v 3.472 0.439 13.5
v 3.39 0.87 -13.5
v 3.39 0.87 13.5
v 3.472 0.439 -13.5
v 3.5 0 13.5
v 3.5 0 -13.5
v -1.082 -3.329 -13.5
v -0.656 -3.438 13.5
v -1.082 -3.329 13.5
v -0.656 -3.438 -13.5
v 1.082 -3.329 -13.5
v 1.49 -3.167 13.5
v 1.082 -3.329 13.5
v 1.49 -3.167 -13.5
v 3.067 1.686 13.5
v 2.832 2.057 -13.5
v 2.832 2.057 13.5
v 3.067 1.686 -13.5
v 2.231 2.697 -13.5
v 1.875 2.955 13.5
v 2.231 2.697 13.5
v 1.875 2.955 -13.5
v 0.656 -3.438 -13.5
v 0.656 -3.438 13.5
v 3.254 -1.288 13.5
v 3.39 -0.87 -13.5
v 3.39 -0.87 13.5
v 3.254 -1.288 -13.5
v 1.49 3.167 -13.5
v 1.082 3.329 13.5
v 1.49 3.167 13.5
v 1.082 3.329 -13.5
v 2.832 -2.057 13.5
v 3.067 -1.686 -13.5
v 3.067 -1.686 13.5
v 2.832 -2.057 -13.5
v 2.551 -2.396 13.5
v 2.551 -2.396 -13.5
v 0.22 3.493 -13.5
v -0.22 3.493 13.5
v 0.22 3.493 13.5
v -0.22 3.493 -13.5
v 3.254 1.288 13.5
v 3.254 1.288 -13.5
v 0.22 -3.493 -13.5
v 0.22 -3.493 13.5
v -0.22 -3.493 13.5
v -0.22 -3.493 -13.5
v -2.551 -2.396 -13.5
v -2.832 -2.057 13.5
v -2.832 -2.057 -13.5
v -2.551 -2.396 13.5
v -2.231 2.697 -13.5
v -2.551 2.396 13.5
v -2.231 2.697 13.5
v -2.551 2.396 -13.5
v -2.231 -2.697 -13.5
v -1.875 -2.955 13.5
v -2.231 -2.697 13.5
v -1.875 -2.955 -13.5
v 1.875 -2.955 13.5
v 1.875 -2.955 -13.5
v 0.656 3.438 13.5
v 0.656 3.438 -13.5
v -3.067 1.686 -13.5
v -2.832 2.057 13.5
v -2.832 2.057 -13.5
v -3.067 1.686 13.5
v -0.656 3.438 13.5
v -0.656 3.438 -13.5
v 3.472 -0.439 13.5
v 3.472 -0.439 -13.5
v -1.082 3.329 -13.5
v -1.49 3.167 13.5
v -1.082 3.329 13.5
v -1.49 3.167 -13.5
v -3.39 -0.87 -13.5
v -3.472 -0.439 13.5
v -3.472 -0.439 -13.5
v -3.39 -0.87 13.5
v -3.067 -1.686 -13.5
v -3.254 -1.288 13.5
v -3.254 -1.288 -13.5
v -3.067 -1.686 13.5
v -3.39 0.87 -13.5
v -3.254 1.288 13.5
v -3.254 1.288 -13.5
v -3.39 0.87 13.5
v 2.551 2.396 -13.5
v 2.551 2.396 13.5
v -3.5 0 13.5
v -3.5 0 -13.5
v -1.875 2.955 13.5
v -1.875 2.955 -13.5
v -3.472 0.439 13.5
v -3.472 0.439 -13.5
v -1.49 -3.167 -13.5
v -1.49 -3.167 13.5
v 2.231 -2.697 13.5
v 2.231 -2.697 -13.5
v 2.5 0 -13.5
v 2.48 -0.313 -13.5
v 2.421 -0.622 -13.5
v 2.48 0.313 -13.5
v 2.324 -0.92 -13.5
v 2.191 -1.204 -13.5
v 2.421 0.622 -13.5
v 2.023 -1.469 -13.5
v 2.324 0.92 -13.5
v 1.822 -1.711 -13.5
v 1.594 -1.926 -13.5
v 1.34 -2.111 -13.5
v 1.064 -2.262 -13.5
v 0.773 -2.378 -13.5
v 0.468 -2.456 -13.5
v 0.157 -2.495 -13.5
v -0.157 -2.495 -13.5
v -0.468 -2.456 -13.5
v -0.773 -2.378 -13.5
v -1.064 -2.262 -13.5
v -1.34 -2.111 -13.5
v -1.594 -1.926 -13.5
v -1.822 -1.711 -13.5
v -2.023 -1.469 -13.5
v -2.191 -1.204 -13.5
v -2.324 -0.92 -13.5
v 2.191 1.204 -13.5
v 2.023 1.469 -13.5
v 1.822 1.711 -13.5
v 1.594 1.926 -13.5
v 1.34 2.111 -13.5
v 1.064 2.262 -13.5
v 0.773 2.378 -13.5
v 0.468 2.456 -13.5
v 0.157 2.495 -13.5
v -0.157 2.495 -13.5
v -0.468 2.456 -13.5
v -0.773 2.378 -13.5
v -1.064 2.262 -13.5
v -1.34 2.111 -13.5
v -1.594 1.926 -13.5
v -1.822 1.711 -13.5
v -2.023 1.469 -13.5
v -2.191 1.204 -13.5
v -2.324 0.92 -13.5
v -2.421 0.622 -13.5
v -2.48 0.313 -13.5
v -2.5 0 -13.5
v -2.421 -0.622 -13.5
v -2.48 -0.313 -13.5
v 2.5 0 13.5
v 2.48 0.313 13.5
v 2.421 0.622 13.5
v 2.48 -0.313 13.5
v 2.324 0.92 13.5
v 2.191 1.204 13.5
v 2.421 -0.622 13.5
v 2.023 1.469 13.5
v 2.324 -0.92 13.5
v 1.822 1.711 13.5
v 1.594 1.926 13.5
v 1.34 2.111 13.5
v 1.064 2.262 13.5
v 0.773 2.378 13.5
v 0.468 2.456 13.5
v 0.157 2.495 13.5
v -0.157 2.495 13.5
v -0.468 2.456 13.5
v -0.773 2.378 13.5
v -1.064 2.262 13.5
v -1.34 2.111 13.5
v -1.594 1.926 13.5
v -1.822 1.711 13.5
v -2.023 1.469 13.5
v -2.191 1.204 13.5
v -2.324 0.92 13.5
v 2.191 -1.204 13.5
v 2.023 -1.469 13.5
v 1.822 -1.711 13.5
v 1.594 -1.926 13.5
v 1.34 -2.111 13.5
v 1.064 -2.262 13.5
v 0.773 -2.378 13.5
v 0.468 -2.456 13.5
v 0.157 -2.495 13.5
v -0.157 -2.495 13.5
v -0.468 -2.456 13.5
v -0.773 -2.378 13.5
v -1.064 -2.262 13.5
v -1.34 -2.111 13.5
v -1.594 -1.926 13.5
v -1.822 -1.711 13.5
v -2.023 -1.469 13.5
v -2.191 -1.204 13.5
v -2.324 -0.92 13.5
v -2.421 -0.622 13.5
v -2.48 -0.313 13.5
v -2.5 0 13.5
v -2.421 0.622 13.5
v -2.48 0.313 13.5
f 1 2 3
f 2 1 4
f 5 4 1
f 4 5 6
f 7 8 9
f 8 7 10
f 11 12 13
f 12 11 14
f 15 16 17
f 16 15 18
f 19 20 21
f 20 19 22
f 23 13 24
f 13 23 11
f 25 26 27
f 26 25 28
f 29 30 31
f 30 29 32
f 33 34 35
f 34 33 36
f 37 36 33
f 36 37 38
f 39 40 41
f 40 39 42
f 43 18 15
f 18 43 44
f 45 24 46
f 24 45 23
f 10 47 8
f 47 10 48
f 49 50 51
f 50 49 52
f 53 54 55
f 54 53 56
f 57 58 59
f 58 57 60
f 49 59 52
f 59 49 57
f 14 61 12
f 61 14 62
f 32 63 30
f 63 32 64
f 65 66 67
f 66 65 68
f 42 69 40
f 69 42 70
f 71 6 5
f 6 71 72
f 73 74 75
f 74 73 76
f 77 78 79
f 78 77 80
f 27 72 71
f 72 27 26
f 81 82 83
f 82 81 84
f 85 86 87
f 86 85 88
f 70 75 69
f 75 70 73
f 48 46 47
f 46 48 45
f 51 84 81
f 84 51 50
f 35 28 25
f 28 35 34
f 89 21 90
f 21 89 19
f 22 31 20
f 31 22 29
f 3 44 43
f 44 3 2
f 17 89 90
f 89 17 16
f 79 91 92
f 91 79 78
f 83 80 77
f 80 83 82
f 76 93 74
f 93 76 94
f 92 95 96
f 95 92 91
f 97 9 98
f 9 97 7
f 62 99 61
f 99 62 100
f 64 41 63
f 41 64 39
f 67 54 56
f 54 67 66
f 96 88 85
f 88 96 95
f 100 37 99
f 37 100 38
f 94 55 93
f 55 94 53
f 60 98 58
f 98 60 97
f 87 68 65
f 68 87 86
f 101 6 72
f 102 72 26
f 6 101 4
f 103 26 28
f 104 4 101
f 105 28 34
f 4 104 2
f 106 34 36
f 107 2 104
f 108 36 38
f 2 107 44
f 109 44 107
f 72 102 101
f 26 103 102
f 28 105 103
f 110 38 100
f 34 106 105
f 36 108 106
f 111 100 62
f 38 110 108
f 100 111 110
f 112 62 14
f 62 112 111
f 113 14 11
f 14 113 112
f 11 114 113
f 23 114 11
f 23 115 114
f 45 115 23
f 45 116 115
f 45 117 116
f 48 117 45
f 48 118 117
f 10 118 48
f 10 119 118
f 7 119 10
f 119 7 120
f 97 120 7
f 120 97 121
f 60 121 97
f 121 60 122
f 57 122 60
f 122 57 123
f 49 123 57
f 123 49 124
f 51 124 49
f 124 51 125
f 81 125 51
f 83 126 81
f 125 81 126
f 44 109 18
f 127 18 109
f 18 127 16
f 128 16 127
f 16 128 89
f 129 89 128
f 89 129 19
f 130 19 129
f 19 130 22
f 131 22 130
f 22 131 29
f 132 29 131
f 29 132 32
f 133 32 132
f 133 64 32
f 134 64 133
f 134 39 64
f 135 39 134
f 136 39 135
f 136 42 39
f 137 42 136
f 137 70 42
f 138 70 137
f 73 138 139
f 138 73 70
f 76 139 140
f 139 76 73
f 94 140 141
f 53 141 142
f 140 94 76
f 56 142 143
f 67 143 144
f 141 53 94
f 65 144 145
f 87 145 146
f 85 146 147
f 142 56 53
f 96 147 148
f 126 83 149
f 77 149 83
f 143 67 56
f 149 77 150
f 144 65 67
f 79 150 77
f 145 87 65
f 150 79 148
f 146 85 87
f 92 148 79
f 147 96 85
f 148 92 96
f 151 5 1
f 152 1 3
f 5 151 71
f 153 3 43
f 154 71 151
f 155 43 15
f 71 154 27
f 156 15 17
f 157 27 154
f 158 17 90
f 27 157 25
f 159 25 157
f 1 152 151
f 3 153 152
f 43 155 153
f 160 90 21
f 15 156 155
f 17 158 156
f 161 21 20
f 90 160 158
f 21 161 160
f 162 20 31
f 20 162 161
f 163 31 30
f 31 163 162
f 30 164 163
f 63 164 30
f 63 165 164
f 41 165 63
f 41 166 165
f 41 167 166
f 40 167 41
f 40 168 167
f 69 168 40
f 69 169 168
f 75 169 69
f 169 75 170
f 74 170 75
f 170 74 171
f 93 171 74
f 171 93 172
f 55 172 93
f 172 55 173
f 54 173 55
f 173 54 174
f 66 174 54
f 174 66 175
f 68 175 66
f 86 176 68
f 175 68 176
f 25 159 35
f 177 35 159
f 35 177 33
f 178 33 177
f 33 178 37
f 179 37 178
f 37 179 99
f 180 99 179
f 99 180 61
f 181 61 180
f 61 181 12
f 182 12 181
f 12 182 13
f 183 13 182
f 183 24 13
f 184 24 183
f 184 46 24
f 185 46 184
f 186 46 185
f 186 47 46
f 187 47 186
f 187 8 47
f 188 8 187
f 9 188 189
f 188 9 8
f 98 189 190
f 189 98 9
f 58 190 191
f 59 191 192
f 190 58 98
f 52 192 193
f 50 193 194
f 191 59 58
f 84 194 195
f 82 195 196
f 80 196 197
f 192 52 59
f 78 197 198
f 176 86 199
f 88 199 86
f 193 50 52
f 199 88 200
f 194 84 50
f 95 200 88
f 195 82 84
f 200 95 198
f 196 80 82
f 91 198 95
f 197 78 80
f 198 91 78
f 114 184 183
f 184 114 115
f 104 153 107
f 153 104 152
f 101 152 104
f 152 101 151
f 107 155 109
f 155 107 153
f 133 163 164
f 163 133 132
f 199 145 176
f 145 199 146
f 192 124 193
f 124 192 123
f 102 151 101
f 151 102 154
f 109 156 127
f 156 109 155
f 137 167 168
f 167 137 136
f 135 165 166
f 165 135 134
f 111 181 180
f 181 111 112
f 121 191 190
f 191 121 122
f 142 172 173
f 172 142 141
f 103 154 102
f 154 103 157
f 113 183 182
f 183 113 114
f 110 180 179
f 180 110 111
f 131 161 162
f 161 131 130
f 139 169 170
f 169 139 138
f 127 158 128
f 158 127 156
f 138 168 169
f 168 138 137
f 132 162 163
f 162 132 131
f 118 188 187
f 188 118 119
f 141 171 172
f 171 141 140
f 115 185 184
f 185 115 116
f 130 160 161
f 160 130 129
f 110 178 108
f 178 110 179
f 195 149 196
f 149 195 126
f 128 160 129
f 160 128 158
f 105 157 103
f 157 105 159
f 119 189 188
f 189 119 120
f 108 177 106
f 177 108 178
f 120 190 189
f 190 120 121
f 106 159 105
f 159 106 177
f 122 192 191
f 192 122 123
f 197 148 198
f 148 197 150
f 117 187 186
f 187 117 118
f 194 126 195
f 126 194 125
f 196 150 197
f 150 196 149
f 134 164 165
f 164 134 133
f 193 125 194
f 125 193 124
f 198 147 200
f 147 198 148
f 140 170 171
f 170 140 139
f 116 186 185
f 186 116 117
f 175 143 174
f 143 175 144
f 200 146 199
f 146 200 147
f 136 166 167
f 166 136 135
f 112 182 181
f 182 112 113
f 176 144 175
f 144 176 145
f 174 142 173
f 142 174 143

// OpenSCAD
$fn = 50;


difference() {
	union() {
		translate(v = [0, 0, -13.5000000000]) {
			cylinder(h = 27, r = 3.5000000000);
		}
	}
	union() {
		translate(v = [0, 0, -100.0000000000]) {
			cylinder(h = 200, r = 2.5000000000);
		}
	}
}
